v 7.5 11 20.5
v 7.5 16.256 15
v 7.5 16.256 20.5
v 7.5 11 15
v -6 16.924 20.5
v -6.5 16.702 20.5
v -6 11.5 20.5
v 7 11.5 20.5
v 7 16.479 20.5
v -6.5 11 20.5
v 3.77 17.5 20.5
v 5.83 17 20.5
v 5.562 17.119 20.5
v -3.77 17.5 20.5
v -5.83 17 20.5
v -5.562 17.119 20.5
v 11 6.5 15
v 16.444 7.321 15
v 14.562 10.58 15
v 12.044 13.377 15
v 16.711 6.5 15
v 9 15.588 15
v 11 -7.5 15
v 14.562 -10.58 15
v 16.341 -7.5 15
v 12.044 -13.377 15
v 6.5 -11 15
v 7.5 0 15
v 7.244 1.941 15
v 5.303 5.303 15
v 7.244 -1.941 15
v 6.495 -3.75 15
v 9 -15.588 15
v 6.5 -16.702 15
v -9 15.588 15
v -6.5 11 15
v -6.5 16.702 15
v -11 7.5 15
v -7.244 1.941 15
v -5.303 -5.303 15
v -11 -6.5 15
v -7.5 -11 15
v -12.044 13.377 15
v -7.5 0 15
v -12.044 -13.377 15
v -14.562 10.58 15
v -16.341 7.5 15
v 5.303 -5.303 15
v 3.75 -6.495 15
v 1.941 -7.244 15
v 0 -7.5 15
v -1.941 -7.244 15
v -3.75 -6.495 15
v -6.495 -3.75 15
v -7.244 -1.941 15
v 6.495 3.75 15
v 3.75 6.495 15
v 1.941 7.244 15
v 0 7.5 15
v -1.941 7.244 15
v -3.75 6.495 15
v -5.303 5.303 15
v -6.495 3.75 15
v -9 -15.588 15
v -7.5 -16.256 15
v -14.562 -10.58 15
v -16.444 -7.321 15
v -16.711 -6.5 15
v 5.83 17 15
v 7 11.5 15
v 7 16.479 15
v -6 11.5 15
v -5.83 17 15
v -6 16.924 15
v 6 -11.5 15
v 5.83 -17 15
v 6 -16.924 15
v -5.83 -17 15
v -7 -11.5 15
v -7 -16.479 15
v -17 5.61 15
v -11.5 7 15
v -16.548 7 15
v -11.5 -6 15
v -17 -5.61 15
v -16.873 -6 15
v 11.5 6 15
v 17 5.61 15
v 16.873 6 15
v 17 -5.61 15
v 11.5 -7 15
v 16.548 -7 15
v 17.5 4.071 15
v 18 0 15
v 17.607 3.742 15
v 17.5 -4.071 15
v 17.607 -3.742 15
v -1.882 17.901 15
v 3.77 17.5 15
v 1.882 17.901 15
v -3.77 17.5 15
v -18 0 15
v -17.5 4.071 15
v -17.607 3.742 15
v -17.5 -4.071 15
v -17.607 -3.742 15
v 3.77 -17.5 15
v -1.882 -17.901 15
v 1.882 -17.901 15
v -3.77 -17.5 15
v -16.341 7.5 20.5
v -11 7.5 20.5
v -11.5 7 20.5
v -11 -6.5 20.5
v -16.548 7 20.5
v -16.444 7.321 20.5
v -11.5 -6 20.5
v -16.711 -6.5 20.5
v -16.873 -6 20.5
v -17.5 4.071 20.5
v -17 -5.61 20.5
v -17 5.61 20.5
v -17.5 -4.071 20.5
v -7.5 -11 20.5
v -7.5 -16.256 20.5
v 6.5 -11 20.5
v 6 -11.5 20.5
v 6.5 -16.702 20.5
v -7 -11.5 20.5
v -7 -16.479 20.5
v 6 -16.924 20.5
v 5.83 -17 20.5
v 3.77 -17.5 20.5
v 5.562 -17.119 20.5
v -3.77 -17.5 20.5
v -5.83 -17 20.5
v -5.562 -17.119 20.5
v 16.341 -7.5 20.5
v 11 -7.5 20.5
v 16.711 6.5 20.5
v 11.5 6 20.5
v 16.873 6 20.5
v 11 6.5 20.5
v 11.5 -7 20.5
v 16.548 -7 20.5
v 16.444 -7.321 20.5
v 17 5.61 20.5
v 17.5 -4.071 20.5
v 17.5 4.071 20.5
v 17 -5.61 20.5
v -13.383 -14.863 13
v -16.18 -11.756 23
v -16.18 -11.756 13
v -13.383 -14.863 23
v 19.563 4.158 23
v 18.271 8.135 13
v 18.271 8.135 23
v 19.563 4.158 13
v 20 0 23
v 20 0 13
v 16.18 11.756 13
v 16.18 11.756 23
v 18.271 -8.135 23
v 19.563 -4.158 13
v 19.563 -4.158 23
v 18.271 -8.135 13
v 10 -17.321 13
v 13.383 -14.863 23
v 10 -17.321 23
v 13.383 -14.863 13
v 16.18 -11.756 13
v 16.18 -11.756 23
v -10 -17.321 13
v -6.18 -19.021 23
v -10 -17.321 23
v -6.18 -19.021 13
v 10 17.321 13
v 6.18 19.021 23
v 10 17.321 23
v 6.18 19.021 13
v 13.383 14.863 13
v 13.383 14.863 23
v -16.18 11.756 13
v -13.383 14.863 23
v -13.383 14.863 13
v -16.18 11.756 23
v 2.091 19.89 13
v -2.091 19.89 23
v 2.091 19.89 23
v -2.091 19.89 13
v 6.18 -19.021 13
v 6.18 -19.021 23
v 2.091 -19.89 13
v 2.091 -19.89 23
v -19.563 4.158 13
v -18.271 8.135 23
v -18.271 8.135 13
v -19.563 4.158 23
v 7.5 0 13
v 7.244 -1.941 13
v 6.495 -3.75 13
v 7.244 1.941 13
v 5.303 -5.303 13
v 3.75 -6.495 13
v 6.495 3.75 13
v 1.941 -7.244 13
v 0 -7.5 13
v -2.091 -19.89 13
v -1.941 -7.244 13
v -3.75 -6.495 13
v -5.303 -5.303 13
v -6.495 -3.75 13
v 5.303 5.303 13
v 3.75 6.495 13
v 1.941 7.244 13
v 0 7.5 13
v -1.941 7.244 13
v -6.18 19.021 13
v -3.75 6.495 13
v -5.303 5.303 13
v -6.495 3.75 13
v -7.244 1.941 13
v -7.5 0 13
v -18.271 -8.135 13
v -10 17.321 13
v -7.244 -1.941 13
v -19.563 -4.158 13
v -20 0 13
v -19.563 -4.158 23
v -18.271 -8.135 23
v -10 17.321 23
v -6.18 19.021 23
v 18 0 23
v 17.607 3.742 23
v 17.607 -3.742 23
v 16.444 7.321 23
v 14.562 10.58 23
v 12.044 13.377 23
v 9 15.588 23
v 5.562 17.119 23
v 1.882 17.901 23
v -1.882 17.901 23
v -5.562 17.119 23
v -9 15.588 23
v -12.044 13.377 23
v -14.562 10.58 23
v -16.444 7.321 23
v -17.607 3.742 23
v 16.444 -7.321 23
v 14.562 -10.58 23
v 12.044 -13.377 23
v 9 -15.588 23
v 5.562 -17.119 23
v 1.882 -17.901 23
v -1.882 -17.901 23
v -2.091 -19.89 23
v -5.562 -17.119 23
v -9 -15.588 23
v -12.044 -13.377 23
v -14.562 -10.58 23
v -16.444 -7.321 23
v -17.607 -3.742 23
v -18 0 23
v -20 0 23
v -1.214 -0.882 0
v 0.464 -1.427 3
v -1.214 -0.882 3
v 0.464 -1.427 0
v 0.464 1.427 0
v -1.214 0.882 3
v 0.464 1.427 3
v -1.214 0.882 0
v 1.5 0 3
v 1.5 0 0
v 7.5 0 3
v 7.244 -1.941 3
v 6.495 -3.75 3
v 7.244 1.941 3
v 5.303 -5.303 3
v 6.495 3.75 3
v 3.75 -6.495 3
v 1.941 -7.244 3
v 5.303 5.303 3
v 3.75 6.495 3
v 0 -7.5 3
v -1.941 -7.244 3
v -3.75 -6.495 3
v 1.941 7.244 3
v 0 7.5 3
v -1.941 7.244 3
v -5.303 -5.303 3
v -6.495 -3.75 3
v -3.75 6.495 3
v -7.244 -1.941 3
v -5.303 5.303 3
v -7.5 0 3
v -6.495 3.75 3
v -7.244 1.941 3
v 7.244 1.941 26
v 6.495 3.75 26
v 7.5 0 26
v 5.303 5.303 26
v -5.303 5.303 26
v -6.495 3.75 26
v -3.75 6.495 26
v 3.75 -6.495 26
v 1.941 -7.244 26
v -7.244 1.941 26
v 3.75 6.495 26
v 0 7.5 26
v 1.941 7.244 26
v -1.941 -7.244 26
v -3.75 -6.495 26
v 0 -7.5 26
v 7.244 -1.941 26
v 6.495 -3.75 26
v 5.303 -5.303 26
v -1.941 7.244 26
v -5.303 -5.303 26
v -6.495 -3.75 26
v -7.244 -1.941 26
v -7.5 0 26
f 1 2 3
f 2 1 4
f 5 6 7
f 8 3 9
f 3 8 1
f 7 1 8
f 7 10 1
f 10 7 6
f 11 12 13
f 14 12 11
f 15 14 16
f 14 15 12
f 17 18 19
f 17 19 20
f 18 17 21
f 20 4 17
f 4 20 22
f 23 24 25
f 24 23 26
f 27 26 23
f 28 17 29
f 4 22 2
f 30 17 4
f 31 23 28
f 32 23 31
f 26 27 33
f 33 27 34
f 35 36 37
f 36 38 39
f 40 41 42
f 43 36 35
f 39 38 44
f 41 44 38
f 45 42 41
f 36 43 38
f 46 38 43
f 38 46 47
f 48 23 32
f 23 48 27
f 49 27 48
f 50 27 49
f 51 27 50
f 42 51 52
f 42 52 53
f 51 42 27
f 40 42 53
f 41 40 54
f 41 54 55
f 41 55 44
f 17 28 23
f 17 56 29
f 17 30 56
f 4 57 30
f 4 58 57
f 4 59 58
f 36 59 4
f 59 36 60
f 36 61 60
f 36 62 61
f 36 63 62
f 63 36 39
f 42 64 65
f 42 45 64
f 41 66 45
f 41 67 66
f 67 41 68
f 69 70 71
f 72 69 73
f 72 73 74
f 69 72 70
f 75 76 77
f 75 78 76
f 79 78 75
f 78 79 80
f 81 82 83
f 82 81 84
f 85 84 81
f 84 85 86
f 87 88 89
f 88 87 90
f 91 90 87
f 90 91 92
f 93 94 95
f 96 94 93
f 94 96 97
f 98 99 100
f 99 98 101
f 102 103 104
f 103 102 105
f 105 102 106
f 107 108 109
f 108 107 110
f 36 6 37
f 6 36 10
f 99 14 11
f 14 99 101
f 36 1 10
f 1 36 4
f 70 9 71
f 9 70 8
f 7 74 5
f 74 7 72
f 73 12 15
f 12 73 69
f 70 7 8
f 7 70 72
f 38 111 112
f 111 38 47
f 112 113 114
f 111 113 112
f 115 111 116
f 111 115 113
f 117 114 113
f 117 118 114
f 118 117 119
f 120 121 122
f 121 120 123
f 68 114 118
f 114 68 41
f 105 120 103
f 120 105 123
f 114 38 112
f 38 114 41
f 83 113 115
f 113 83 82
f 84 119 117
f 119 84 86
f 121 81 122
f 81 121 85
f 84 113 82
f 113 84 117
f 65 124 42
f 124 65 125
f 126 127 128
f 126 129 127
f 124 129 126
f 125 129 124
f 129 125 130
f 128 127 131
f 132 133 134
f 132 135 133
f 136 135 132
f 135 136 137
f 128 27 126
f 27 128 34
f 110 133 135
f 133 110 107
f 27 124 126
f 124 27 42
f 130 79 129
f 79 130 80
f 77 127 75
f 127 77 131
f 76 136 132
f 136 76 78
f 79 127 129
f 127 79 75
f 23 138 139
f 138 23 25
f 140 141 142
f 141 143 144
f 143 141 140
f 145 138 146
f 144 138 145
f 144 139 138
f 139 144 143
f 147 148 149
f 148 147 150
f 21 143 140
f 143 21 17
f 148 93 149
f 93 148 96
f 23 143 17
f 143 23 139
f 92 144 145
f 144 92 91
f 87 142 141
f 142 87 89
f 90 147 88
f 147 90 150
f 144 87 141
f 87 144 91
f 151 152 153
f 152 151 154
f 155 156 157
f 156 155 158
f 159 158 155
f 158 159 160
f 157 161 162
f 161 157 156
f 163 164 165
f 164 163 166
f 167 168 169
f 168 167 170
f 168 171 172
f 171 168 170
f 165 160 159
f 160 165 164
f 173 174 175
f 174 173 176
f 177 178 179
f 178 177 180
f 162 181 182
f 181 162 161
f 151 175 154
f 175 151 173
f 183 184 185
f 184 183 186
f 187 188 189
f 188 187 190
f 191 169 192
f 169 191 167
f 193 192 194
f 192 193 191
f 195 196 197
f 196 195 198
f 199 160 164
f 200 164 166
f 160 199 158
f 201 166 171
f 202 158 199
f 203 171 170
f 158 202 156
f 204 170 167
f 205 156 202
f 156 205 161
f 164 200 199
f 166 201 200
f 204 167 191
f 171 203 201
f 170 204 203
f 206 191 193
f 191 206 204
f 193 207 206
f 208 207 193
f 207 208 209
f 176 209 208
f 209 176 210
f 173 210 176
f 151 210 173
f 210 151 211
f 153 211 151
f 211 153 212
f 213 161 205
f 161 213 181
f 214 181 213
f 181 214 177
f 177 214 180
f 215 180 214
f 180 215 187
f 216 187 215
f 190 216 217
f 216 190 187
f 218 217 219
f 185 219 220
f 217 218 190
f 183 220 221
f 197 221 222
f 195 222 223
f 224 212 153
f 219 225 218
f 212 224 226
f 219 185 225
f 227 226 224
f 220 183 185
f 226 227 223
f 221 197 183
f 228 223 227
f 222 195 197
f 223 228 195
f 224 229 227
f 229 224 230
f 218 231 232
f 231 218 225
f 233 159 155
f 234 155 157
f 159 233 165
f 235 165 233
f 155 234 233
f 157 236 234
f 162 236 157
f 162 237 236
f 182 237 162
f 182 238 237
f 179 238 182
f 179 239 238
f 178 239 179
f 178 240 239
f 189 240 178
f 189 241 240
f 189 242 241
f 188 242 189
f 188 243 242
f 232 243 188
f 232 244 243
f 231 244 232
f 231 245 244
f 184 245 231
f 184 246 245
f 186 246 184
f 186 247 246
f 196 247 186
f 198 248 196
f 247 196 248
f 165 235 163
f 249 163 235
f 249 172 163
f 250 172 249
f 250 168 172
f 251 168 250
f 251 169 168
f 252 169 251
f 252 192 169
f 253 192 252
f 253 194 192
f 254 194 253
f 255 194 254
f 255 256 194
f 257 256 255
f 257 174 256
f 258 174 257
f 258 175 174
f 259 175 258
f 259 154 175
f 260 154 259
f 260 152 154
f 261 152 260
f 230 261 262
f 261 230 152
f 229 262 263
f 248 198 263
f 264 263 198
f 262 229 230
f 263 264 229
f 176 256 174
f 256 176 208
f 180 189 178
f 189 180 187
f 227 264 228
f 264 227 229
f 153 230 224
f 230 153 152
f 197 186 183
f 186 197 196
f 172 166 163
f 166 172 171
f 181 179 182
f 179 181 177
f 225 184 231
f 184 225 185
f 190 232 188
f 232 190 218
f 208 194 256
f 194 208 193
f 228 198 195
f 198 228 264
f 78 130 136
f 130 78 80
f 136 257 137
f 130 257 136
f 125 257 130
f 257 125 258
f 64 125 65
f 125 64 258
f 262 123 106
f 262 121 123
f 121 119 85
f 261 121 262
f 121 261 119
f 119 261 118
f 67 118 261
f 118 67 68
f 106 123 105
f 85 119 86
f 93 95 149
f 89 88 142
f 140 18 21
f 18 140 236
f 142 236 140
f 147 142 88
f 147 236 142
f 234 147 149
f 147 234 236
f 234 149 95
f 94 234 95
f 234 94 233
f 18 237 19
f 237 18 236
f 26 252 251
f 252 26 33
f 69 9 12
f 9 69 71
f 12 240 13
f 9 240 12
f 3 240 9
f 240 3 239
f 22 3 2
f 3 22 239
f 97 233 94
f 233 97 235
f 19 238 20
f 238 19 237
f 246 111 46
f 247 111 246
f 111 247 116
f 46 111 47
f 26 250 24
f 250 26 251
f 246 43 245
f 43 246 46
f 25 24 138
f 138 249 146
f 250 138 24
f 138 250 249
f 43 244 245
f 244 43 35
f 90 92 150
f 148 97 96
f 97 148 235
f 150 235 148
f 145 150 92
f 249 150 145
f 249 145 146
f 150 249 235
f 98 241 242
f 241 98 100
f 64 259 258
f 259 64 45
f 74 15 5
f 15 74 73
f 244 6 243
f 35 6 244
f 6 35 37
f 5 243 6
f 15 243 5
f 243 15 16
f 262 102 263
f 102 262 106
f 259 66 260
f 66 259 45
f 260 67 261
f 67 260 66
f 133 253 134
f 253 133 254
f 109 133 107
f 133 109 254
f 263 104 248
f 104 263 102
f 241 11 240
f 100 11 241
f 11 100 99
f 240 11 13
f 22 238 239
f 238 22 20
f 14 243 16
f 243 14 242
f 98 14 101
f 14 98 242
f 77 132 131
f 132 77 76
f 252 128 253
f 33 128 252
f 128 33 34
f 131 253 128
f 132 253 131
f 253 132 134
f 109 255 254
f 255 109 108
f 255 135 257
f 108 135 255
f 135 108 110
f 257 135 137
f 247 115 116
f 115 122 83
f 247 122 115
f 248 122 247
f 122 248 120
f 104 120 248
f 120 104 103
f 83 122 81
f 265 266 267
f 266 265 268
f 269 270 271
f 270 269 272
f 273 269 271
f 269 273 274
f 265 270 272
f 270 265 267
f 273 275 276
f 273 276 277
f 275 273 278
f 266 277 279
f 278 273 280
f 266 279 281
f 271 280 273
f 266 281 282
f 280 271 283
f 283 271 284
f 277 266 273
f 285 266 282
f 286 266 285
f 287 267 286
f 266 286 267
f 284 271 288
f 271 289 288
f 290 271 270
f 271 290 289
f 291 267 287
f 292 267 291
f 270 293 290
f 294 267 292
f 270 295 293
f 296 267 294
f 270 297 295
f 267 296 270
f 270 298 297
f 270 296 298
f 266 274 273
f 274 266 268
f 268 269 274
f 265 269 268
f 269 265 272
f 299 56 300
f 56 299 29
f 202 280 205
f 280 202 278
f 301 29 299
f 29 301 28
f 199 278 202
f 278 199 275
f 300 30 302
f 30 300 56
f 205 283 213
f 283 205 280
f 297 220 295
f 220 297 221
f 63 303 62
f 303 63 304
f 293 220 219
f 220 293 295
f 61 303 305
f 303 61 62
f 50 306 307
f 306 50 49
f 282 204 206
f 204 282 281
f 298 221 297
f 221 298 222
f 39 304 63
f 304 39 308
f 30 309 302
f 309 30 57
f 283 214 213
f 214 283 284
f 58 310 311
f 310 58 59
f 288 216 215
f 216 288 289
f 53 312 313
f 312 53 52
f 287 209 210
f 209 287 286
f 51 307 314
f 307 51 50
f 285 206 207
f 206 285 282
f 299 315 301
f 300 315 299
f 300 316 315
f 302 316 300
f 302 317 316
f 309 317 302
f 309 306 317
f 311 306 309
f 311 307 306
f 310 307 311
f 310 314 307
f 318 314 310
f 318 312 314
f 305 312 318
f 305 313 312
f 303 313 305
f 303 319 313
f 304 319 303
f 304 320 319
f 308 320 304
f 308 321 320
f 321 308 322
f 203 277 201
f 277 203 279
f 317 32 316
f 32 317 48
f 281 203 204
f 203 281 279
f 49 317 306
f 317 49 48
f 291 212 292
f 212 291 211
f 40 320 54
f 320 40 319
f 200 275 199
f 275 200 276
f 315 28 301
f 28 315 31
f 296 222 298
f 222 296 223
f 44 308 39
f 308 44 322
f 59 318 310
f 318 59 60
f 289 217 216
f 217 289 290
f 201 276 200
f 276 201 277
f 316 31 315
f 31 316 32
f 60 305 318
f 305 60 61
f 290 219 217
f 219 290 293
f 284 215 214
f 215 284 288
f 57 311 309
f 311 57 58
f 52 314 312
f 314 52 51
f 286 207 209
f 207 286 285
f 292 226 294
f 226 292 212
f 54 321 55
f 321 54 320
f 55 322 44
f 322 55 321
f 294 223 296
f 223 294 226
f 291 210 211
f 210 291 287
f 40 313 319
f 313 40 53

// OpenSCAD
point_height = 3;
weight_width = 5.5;
weight_length = 13;
top_height = 10;
top_diameter = 40;
thickness = 2;
core_thickness = 15;
top_z = point_height + 10;

module base() {
    module weight_container(hole = false) {
        for (i = [0:3]) {
            rotate(90 * i)
            translate([-weight_width - 1, (core_thickness / 2) + 3.5, thickness])
            difference() {
                cube([weight_length + 1, weight_width + 1, weight_width]);
                translate([0.5, 0.5])
                cube([weight_length, weight_width, weight_width]);
            }
        }
    }

    cylinder(point_height, d = 3);
    translate([0, 0, point_height])
    cylinder(top_z + top_height, d = core_thickness);
    translate([0, 0, top_z]) {
        difference() {
            cylinder(top_height, d = top_diameter);
            translate([0, 0, thickness])
            cylinder(top_height - thickness, d = top_diameter - (thickness * 2));
            weight_container(hole = true);
        }
        weight_container();
    }
}

base();
